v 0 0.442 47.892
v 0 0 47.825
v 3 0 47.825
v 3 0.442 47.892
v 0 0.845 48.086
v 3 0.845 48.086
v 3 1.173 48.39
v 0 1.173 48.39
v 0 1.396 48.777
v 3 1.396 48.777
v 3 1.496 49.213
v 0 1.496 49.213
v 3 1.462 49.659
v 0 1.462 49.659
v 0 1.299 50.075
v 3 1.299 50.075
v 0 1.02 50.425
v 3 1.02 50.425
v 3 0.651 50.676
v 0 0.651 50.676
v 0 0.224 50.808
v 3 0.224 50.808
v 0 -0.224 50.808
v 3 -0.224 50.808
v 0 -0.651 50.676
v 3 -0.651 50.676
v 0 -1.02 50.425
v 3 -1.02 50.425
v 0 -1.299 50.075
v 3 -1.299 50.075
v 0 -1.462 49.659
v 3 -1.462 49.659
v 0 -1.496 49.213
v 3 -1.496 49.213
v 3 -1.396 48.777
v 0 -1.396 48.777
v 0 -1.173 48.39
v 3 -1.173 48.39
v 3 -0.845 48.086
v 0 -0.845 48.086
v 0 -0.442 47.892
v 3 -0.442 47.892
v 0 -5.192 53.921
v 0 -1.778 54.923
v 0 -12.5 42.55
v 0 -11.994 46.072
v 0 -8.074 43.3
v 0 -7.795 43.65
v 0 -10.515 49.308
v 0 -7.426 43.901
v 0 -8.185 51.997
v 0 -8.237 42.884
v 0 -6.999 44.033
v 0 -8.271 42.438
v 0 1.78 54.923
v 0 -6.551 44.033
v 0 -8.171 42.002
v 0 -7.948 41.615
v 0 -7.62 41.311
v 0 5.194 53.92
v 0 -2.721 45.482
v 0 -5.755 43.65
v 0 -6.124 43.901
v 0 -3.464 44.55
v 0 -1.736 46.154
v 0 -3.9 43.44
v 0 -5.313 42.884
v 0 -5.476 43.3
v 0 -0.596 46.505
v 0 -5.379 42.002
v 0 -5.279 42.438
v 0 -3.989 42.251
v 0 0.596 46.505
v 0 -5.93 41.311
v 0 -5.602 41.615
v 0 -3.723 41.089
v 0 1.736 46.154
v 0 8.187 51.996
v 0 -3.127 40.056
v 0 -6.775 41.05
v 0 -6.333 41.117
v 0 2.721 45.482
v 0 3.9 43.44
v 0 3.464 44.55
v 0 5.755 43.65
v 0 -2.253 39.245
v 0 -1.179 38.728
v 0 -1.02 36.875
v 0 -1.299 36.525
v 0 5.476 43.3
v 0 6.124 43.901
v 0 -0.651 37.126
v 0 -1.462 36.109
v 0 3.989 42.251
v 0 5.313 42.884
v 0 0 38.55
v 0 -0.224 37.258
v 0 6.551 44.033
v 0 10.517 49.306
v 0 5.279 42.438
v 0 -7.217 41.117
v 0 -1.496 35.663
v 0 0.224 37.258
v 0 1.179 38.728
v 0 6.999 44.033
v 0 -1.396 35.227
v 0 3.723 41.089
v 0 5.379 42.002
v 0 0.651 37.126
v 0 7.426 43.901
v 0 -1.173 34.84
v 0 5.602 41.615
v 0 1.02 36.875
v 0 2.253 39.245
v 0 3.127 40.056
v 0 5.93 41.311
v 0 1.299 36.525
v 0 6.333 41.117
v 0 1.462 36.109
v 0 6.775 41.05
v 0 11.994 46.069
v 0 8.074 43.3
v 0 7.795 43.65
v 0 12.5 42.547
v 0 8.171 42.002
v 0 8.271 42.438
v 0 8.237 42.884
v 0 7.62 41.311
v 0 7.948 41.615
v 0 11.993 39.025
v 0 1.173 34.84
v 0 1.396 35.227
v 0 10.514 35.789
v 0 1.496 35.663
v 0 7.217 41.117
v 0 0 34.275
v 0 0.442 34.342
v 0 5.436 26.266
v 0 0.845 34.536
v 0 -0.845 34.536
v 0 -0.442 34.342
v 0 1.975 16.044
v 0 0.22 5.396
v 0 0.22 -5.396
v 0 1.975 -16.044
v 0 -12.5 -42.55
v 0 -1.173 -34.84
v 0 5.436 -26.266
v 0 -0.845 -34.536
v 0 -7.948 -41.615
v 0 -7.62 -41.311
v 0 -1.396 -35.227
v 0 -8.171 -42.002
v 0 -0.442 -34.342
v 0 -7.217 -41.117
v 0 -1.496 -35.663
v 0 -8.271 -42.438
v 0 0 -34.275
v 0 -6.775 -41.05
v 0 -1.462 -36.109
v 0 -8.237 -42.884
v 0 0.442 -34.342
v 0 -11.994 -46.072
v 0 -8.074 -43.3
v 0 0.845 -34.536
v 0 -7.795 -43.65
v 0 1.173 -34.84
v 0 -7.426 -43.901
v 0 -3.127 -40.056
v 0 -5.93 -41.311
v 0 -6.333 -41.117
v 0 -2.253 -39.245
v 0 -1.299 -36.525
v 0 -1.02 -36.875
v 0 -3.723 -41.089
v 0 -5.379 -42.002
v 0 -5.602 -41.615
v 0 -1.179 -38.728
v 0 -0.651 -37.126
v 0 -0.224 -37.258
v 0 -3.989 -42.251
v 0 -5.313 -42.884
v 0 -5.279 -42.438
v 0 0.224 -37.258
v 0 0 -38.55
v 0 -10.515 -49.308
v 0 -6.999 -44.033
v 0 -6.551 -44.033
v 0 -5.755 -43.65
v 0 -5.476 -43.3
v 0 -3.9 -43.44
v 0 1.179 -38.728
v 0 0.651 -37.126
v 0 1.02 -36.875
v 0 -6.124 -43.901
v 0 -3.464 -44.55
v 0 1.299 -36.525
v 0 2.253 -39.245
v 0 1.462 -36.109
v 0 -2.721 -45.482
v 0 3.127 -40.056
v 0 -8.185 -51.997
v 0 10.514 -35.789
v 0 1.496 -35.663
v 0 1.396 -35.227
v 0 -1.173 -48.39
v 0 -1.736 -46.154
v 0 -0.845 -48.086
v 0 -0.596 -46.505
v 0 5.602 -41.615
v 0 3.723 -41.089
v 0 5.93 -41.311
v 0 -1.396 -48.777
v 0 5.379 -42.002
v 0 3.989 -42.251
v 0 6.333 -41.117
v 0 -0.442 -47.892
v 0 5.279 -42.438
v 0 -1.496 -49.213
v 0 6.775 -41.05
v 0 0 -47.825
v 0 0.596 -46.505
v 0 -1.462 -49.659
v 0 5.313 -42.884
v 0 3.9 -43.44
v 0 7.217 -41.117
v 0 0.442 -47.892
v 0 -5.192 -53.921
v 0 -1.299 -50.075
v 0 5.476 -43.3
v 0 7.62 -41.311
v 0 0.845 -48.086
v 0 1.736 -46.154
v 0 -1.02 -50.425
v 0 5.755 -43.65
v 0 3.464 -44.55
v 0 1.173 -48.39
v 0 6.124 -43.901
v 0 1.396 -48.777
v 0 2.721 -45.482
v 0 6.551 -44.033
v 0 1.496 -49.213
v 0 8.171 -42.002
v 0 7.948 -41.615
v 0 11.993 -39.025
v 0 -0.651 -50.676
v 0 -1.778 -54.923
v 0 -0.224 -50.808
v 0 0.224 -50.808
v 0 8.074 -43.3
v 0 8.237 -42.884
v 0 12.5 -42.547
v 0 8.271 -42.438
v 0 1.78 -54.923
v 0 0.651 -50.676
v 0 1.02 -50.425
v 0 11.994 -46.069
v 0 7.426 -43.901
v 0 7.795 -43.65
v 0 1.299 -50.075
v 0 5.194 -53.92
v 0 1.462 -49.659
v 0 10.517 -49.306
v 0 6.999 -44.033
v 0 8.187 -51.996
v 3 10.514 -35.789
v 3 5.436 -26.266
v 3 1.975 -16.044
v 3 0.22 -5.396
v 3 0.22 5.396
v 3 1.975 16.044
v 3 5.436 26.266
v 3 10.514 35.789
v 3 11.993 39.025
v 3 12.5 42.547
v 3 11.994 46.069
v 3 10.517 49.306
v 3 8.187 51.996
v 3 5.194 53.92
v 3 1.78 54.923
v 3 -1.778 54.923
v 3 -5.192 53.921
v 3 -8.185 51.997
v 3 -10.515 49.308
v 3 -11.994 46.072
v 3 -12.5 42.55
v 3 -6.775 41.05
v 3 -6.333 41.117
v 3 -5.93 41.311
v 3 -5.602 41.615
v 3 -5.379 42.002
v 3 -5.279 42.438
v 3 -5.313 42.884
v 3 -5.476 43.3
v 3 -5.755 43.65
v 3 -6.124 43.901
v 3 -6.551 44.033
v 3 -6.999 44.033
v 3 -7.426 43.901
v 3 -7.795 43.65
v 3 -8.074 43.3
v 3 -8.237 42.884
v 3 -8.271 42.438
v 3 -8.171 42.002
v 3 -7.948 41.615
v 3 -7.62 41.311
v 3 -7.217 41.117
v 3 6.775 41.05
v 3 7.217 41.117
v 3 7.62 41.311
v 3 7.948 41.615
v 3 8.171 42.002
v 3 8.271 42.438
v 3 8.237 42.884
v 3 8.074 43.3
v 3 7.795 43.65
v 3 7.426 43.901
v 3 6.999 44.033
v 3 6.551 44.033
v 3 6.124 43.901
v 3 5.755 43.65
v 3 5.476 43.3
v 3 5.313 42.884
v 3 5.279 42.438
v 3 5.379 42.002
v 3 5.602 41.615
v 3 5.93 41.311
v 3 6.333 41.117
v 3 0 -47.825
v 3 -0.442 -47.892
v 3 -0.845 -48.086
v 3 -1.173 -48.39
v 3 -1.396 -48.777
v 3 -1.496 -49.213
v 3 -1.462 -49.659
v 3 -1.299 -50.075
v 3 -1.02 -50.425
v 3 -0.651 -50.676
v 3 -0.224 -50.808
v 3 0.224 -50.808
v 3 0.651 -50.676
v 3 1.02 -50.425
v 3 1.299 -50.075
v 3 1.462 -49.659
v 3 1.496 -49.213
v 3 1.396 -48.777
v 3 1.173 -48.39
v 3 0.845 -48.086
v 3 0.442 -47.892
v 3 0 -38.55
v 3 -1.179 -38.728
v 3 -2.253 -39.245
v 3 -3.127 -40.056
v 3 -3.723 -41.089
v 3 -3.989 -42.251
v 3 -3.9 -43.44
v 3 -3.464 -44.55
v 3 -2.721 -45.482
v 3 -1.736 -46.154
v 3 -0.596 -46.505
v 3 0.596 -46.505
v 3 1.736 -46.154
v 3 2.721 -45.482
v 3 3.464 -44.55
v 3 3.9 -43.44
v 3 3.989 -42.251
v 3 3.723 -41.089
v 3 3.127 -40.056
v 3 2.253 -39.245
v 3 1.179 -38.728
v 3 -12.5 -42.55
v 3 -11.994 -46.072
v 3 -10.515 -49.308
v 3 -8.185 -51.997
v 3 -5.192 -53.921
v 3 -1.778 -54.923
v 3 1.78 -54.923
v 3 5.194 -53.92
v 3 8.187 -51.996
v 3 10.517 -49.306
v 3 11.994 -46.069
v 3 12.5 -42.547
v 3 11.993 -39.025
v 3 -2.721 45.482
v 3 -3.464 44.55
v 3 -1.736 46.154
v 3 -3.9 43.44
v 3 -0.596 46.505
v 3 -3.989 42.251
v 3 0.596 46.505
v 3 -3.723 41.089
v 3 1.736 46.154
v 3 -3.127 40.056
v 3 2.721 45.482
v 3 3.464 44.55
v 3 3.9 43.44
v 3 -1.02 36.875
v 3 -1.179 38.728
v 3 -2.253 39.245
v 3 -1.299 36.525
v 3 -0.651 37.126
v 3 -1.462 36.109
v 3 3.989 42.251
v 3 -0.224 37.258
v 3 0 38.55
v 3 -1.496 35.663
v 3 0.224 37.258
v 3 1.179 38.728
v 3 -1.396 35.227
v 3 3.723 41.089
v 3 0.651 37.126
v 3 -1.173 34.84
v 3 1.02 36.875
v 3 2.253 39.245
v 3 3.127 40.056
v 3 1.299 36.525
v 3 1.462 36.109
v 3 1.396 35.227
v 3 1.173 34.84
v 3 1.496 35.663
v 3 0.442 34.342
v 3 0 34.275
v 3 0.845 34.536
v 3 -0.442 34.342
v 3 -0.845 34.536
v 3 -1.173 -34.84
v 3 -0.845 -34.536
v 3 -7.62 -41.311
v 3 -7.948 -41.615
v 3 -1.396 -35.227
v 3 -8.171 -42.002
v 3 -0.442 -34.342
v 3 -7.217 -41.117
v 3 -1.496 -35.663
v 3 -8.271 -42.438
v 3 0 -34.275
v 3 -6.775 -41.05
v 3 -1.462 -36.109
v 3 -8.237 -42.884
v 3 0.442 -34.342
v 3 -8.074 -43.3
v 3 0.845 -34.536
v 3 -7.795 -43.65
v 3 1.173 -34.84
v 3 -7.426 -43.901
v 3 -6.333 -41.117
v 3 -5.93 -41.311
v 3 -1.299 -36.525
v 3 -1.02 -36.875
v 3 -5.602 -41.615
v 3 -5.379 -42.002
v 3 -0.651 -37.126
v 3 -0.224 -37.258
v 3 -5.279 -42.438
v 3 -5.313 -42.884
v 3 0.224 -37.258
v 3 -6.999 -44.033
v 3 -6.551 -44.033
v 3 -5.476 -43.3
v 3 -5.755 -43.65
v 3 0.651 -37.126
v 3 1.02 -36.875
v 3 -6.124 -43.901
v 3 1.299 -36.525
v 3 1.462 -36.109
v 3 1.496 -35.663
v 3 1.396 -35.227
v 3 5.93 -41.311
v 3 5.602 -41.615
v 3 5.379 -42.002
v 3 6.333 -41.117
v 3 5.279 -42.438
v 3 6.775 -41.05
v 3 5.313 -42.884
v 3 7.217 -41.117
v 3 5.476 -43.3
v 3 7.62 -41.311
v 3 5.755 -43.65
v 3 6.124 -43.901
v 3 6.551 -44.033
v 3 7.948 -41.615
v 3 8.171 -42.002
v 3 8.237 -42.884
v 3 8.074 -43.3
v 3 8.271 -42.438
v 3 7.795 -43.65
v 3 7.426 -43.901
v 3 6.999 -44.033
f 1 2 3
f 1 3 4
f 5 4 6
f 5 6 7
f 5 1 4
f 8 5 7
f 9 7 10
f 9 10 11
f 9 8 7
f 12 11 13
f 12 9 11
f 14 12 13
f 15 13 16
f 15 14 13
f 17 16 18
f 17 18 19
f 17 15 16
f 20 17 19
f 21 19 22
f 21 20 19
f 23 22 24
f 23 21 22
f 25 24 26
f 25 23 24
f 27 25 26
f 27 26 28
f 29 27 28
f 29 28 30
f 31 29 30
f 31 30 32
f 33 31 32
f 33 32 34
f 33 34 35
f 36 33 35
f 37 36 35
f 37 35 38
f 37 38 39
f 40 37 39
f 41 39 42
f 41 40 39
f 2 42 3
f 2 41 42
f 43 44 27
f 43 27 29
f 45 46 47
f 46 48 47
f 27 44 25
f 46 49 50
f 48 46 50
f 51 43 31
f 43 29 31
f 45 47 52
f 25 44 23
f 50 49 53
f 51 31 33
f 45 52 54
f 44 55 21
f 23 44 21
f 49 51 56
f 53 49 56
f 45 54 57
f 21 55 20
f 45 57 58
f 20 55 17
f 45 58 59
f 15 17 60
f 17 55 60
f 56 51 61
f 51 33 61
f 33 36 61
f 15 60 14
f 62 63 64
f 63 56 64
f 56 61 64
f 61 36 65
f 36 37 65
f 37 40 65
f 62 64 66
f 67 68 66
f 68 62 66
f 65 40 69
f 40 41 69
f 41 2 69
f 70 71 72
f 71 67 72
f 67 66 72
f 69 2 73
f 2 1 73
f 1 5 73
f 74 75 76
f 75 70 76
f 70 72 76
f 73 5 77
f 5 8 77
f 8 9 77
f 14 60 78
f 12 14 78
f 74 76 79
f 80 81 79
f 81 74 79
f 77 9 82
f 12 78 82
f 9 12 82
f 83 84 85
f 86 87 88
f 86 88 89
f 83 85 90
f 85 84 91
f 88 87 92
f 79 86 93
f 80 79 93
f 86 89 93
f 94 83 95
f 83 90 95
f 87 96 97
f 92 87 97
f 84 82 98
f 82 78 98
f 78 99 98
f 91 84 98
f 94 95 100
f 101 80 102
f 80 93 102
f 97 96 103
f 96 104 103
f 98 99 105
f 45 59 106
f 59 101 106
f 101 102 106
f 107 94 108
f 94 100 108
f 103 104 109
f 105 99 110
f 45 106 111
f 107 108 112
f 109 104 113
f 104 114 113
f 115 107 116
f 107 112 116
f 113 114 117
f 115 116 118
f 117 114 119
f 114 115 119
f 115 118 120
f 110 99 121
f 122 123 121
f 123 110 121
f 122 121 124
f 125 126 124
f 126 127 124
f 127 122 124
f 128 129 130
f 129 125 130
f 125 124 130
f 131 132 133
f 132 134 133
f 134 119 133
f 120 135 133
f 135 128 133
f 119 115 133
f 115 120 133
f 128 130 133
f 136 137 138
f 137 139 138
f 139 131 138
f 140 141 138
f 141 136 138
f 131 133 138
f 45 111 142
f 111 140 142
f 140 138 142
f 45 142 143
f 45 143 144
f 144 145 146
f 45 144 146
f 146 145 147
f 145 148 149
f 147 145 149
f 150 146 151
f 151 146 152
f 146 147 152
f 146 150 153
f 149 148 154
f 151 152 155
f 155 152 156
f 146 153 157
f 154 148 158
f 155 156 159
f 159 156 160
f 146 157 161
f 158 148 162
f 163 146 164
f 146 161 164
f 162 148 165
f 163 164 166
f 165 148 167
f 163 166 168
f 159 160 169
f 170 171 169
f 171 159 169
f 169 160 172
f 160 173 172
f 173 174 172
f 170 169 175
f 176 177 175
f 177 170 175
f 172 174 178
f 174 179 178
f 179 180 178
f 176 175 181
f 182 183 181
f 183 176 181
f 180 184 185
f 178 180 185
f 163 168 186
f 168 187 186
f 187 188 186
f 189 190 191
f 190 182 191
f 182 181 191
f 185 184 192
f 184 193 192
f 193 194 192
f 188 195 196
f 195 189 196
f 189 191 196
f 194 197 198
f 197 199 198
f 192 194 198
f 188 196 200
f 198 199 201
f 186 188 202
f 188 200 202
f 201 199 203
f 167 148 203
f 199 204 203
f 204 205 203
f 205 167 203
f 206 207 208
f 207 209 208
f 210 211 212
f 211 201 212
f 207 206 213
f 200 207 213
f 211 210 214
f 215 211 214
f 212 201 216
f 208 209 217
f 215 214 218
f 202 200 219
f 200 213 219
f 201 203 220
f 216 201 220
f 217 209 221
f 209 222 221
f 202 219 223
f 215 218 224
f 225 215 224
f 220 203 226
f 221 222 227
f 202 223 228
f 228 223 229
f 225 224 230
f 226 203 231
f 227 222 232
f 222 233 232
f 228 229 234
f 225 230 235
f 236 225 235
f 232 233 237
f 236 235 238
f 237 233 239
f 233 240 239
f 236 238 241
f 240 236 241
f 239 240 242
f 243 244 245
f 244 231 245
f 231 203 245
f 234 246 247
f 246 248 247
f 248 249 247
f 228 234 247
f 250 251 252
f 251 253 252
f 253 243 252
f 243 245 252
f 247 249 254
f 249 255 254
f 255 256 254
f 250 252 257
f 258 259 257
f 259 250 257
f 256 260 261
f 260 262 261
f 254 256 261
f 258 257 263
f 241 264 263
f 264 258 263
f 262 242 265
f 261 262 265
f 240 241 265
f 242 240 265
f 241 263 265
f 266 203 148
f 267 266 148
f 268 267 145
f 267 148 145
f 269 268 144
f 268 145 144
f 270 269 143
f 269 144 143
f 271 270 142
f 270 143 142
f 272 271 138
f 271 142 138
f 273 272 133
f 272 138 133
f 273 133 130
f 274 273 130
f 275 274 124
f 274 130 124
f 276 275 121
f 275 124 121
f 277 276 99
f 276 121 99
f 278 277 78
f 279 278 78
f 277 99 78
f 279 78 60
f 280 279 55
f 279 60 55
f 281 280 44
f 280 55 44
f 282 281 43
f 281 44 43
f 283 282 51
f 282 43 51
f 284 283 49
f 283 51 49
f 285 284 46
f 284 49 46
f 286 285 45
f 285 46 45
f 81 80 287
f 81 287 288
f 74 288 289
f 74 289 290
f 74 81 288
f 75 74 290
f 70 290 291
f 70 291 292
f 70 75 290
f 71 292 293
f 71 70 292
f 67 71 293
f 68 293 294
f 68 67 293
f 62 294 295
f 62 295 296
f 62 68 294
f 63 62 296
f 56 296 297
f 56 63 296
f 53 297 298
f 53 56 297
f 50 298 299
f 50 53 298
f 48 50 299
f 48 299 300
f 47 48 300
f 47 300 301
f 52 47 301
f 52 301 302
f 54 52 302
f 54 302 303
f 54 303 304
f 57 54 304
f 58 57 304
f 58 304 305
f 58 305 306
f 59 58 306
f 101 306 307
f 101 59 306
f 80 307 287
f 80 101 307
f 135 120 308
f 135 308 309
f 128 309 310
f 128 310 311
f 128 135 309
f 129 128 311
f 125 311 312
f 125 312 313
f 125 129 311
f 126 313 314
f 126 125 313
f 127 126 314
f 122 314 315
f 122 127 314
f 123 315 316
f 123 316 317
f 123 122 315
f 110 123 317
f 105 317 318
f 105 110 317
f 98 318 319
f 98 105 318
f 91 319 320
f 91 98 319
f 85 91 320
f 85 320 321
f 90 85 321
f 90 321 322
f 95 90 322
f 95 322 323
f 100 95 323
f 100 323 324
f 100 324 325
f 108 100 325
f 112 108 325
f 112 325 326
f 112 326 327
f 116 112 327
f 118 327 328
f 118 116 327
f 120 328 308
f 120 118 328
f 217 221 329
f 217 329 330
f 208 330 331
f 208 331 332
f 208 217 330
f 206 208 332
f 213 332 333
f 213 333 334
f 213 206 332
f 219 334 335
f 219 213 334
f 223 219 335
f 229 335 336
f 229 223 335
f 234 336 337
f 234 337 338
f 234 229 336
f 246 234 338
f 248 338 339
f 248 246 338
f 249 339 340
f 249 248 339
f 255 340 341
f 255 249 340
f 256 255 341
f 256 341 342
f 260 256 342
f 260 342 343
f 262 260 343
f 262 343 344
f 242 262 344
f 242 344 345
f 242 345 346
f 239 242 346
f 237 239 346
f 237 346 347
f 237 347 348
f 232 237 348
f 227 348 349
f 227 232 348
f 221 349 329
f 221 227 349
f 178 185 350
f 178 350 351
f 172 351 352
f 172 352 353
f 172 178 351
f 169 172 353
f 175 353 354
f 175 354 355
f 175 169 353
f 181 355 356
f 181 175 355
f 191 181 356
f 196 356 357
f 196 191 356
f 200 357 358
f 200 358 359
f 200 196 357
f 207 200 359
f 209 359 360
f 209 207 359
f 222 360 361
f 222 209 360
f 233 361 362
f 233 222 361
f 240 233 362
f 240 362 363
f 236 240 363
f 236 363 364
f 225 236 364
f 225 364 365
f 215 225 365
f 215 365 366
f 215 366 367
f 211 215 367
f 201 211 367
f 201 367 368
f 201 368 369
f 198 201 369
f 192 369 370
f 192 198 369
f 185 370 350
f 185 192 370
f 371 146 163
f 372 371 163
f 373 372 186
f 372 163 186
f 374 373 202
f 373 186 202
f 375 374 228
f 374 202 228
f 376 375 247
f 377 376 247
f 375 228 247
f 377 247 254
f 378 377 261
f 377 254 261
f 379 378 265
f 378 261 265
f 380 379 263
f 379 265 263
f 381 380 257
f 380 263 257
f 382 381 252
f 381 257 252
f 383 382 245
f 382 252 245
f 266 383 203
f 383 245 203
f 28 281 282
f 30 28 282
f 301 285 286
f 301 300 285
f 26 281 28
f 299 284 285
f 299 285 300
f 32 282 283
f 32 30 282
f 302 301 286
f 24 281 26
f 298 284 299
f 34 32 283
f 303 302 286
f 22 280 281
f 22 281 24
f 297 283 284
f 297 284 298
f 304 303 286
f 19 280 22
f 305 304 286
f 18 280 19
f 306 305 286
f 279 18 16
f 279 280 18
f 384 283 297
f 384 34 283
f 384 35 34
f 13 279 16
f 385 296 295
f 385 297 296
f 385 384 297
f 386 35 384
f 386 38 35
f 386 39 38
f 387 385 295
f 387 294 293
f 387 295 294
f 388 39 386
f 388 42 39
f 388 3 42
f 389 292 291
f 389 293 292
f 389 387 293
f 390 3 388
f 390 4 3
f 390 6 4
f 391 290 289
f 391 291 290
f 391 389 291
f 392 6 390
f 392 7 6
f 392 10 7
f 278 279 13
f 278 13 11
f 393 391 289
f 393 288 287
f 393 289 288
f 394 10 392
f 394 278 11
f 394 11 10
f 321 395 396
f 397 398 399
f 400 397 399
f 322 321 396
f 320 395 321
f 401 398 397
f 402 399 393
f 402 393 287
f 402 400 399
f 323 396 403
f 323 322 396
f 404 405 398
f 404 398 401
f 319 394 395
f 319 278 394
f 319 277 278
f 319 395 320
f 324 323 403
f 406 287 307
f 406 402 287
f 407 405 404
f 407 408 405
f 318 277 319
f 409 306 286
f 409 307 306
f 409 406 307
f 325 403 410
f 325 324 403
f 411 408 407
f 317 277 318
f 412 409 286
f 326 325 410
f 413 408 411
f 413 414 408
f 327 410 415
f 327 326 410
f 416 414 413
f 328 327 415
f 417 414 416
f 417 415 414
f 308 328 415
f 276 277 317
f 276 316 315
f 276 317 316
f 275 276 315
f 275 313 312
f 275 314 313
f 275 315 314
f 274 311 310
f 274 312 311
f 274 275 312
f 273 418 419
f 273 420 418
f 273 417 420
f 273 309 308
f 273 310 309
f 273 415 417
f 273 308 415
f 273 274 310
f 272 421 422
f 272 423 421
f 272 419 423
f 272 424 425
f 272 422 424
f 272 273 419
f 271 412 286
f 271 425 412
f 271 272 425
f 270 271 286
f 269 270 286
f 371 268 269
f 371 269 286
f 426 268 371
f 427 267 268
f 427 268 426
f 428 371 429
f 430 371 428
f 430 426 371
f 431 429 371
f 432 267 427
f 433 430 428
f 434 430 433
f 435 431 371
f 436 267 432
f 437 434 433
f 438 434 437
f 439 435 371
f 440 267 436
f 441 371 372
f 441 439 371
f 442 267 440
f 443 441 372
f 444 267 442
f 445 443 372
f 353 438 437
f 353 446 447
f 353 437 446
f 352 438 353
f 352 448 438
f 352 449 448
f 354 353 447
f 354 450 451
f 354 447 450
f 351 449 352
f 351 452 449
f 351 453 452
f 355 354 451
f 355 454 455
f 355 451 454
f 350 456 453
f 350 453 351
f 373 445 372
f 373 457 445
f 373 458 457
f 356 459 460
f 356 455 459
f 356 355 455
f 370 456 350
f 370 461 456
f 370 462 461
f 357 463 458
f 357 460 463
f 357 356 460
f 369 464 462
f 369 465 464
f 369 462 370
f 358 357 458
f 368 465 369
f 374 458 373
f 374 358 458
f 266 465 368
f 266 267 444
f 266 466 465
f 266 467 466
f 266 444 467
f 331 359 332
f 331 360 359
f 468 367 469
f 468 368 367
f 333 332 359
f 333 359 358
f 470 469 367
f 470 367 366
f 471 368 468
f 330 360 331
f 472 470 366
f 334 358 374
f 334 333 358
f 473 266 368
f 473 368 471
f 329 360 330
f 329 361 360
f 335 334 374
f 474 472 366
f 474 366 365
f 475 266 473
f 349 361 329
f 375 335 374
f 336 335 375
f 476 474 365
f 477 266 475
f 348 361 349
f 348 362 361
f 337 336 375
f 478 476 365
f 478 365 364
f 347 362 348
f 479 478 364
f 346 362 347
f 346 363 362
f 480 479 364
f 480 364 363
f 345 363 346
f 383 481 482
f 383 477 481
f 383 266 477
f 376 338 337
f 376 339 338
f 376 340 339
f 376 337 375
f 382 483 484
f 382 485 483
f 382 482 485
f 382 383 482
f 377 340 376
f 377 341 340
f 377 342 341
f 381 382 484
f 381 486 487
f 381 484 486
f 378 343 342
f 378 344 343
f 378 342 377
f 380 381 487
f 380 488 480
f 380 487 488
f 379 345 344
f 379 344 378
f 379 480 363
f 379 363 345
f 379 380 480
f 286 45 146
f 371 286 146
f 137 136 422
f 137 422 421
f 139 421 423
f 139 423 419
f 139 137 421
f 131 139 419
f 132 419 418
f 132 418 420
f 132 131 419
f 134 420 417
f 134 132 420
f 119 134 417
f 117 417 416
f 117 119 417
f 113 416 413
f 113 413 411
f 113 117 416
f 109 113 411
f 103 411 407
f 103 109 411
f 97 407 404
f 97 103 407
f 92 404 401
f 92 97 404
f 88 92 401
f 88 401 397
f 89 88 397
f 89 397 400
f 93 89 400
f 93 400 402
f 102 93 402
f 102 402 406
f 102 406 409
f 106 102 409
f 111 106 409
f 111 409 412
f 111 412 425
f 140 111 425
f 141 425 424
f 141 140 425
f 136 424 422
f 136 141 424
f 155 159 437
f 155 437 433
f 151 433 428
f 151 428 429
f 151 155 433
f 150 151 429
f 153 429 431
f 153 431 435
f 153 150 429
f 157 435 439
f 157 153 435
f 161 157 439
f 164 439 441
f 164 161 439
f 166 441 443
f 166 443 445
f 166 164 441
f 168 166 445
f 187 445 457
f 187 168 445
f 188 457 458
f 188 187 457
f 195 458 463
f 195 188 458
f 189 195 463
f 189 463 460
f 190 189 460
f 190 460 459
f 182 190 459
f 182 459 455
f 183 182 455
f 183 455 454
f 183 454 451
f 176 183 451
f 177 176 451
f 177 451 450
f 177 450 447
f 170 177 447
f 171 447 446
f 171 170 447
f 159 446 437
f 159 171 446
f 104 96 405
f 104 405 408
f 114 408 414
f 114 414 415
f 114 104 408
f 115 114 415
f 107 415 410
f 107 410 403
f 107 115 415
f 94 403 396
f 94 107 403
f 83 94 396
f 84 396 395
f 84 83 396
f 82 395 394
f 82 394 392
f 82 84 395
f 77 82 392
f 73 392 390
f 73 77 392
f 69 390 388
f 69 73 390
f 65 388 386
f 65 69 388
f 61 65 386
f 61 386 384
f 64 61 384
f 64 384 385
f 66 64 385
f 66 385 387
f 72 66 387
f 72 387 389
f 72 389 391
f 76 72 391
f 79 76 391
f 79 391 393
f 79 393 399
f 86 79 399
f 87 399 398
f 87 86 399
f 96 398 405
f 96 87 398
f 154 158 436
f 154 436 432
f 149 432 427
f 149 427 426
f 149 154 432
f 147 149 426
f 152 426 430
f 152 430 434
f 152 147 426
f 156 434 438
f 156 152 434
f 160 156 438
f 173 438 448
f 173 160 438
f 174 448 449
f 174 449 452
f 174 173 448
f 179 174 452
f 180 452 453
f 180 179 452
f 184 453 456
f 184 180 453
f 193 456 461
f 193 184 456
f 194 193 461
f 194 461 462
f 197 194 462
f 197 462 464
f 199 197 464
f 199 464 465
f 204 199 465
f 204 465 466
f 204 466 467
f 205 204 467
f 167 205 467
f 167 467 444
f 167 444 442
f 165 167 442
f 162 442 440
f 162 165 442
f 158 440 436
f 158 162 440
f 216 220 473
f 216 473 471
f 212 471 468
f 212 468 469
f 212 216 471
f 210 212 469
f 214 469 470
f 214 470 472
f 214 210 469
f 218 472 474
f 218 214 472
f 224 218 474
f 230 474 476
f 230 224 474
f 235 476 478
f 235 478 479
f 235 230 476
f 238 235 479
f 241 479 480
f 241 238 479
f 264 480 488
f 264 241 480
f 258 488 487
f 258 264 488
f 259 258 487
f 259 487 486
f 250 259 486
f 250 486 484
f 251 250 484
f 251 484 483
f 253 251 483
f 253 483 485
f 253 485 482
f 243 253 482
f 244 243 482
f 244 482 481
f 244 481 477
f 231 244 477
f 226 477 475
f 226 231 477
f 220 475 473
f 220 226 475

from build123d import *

# Parameters (mm, degrees)
SKETCH1_R           = 4
SKETCH1_R_2         = 1.5
BOSS_EXTRUDE1_DEPTH = 3


with BuildPart() as part:
    # Sketch1 → Boss-Extrude1 (new body)
    with BuildSketch(Plane(origin=(0, 0, 0), x_dir=(0, 0, -1), z_dir=(1, 0, 0))):
        with BuildLine():
            Line((-42.55, -12.5), (42.55, -12.5))
            ThreePointArc((42.55, -12.5), (54.543190221, 3.523263872), (35.789172189, 10.51385787))
            ThreePointArc((35.789172189, 10.51385787), (0, 0), (-35.789172189, 10.51385787))
            ThreePointArc((-35.789172189, 10.51385787), (-54.543190221, 3.523263872), (-42.55, -12.5))
        make_face()
        with Locations((-42.55, 0)):
            Circle(SKETCH1_R, mode=Mode.SUBTRACT)
        with Locations((-35.775, 0)):
            Circle(SKETCH1_R_2, mode=Mode.SUBTRACT)
        with Locations((-42.55, -6.775)):
            Circle(SKETCH1_R_2, mode=Mode.SUBTRACT)
        with Locations((-49.325, 0)):
            Circle(SKETCH1_R_2, mode=Mode.SUBTRACT)
        with Locations((-42.55, 6.775)):
            Circle(SKETCH1_R_2, mode=Mode.SUBTRACT)
        with Locations(Location((42.55, 6.775, 0), (0, 0, 180))):
            Circle(SKETCH1_R_2, mode=Mode.SUBTRACT)
        with Locations(Location((49.325, 0, 0), (0, 0, 180))):
            Circle(SKETCH1_R_2, mode=Mode.SUBTRACT)
        with Locations(Location((42.55, -6.775, 0), (0, 0, 180))):
            Circle(SKETCH1_R_2, mode=Mode.SUBTRACT)
        with Locations(Location((35.775, 0, 0), (0, 0, 180))):
            Circle(SKETCH1_R_2, mode=Mode.SUBTRACT)
        with Locations(Location((42.55, 0, 0), (0, 0, 180))):
            Circle(SKETCH1_R, mode=Mode.SUBTRACT)
    extrude(amount=BOSS_EXTRUDE1_DEPTH)


solid = part.part
